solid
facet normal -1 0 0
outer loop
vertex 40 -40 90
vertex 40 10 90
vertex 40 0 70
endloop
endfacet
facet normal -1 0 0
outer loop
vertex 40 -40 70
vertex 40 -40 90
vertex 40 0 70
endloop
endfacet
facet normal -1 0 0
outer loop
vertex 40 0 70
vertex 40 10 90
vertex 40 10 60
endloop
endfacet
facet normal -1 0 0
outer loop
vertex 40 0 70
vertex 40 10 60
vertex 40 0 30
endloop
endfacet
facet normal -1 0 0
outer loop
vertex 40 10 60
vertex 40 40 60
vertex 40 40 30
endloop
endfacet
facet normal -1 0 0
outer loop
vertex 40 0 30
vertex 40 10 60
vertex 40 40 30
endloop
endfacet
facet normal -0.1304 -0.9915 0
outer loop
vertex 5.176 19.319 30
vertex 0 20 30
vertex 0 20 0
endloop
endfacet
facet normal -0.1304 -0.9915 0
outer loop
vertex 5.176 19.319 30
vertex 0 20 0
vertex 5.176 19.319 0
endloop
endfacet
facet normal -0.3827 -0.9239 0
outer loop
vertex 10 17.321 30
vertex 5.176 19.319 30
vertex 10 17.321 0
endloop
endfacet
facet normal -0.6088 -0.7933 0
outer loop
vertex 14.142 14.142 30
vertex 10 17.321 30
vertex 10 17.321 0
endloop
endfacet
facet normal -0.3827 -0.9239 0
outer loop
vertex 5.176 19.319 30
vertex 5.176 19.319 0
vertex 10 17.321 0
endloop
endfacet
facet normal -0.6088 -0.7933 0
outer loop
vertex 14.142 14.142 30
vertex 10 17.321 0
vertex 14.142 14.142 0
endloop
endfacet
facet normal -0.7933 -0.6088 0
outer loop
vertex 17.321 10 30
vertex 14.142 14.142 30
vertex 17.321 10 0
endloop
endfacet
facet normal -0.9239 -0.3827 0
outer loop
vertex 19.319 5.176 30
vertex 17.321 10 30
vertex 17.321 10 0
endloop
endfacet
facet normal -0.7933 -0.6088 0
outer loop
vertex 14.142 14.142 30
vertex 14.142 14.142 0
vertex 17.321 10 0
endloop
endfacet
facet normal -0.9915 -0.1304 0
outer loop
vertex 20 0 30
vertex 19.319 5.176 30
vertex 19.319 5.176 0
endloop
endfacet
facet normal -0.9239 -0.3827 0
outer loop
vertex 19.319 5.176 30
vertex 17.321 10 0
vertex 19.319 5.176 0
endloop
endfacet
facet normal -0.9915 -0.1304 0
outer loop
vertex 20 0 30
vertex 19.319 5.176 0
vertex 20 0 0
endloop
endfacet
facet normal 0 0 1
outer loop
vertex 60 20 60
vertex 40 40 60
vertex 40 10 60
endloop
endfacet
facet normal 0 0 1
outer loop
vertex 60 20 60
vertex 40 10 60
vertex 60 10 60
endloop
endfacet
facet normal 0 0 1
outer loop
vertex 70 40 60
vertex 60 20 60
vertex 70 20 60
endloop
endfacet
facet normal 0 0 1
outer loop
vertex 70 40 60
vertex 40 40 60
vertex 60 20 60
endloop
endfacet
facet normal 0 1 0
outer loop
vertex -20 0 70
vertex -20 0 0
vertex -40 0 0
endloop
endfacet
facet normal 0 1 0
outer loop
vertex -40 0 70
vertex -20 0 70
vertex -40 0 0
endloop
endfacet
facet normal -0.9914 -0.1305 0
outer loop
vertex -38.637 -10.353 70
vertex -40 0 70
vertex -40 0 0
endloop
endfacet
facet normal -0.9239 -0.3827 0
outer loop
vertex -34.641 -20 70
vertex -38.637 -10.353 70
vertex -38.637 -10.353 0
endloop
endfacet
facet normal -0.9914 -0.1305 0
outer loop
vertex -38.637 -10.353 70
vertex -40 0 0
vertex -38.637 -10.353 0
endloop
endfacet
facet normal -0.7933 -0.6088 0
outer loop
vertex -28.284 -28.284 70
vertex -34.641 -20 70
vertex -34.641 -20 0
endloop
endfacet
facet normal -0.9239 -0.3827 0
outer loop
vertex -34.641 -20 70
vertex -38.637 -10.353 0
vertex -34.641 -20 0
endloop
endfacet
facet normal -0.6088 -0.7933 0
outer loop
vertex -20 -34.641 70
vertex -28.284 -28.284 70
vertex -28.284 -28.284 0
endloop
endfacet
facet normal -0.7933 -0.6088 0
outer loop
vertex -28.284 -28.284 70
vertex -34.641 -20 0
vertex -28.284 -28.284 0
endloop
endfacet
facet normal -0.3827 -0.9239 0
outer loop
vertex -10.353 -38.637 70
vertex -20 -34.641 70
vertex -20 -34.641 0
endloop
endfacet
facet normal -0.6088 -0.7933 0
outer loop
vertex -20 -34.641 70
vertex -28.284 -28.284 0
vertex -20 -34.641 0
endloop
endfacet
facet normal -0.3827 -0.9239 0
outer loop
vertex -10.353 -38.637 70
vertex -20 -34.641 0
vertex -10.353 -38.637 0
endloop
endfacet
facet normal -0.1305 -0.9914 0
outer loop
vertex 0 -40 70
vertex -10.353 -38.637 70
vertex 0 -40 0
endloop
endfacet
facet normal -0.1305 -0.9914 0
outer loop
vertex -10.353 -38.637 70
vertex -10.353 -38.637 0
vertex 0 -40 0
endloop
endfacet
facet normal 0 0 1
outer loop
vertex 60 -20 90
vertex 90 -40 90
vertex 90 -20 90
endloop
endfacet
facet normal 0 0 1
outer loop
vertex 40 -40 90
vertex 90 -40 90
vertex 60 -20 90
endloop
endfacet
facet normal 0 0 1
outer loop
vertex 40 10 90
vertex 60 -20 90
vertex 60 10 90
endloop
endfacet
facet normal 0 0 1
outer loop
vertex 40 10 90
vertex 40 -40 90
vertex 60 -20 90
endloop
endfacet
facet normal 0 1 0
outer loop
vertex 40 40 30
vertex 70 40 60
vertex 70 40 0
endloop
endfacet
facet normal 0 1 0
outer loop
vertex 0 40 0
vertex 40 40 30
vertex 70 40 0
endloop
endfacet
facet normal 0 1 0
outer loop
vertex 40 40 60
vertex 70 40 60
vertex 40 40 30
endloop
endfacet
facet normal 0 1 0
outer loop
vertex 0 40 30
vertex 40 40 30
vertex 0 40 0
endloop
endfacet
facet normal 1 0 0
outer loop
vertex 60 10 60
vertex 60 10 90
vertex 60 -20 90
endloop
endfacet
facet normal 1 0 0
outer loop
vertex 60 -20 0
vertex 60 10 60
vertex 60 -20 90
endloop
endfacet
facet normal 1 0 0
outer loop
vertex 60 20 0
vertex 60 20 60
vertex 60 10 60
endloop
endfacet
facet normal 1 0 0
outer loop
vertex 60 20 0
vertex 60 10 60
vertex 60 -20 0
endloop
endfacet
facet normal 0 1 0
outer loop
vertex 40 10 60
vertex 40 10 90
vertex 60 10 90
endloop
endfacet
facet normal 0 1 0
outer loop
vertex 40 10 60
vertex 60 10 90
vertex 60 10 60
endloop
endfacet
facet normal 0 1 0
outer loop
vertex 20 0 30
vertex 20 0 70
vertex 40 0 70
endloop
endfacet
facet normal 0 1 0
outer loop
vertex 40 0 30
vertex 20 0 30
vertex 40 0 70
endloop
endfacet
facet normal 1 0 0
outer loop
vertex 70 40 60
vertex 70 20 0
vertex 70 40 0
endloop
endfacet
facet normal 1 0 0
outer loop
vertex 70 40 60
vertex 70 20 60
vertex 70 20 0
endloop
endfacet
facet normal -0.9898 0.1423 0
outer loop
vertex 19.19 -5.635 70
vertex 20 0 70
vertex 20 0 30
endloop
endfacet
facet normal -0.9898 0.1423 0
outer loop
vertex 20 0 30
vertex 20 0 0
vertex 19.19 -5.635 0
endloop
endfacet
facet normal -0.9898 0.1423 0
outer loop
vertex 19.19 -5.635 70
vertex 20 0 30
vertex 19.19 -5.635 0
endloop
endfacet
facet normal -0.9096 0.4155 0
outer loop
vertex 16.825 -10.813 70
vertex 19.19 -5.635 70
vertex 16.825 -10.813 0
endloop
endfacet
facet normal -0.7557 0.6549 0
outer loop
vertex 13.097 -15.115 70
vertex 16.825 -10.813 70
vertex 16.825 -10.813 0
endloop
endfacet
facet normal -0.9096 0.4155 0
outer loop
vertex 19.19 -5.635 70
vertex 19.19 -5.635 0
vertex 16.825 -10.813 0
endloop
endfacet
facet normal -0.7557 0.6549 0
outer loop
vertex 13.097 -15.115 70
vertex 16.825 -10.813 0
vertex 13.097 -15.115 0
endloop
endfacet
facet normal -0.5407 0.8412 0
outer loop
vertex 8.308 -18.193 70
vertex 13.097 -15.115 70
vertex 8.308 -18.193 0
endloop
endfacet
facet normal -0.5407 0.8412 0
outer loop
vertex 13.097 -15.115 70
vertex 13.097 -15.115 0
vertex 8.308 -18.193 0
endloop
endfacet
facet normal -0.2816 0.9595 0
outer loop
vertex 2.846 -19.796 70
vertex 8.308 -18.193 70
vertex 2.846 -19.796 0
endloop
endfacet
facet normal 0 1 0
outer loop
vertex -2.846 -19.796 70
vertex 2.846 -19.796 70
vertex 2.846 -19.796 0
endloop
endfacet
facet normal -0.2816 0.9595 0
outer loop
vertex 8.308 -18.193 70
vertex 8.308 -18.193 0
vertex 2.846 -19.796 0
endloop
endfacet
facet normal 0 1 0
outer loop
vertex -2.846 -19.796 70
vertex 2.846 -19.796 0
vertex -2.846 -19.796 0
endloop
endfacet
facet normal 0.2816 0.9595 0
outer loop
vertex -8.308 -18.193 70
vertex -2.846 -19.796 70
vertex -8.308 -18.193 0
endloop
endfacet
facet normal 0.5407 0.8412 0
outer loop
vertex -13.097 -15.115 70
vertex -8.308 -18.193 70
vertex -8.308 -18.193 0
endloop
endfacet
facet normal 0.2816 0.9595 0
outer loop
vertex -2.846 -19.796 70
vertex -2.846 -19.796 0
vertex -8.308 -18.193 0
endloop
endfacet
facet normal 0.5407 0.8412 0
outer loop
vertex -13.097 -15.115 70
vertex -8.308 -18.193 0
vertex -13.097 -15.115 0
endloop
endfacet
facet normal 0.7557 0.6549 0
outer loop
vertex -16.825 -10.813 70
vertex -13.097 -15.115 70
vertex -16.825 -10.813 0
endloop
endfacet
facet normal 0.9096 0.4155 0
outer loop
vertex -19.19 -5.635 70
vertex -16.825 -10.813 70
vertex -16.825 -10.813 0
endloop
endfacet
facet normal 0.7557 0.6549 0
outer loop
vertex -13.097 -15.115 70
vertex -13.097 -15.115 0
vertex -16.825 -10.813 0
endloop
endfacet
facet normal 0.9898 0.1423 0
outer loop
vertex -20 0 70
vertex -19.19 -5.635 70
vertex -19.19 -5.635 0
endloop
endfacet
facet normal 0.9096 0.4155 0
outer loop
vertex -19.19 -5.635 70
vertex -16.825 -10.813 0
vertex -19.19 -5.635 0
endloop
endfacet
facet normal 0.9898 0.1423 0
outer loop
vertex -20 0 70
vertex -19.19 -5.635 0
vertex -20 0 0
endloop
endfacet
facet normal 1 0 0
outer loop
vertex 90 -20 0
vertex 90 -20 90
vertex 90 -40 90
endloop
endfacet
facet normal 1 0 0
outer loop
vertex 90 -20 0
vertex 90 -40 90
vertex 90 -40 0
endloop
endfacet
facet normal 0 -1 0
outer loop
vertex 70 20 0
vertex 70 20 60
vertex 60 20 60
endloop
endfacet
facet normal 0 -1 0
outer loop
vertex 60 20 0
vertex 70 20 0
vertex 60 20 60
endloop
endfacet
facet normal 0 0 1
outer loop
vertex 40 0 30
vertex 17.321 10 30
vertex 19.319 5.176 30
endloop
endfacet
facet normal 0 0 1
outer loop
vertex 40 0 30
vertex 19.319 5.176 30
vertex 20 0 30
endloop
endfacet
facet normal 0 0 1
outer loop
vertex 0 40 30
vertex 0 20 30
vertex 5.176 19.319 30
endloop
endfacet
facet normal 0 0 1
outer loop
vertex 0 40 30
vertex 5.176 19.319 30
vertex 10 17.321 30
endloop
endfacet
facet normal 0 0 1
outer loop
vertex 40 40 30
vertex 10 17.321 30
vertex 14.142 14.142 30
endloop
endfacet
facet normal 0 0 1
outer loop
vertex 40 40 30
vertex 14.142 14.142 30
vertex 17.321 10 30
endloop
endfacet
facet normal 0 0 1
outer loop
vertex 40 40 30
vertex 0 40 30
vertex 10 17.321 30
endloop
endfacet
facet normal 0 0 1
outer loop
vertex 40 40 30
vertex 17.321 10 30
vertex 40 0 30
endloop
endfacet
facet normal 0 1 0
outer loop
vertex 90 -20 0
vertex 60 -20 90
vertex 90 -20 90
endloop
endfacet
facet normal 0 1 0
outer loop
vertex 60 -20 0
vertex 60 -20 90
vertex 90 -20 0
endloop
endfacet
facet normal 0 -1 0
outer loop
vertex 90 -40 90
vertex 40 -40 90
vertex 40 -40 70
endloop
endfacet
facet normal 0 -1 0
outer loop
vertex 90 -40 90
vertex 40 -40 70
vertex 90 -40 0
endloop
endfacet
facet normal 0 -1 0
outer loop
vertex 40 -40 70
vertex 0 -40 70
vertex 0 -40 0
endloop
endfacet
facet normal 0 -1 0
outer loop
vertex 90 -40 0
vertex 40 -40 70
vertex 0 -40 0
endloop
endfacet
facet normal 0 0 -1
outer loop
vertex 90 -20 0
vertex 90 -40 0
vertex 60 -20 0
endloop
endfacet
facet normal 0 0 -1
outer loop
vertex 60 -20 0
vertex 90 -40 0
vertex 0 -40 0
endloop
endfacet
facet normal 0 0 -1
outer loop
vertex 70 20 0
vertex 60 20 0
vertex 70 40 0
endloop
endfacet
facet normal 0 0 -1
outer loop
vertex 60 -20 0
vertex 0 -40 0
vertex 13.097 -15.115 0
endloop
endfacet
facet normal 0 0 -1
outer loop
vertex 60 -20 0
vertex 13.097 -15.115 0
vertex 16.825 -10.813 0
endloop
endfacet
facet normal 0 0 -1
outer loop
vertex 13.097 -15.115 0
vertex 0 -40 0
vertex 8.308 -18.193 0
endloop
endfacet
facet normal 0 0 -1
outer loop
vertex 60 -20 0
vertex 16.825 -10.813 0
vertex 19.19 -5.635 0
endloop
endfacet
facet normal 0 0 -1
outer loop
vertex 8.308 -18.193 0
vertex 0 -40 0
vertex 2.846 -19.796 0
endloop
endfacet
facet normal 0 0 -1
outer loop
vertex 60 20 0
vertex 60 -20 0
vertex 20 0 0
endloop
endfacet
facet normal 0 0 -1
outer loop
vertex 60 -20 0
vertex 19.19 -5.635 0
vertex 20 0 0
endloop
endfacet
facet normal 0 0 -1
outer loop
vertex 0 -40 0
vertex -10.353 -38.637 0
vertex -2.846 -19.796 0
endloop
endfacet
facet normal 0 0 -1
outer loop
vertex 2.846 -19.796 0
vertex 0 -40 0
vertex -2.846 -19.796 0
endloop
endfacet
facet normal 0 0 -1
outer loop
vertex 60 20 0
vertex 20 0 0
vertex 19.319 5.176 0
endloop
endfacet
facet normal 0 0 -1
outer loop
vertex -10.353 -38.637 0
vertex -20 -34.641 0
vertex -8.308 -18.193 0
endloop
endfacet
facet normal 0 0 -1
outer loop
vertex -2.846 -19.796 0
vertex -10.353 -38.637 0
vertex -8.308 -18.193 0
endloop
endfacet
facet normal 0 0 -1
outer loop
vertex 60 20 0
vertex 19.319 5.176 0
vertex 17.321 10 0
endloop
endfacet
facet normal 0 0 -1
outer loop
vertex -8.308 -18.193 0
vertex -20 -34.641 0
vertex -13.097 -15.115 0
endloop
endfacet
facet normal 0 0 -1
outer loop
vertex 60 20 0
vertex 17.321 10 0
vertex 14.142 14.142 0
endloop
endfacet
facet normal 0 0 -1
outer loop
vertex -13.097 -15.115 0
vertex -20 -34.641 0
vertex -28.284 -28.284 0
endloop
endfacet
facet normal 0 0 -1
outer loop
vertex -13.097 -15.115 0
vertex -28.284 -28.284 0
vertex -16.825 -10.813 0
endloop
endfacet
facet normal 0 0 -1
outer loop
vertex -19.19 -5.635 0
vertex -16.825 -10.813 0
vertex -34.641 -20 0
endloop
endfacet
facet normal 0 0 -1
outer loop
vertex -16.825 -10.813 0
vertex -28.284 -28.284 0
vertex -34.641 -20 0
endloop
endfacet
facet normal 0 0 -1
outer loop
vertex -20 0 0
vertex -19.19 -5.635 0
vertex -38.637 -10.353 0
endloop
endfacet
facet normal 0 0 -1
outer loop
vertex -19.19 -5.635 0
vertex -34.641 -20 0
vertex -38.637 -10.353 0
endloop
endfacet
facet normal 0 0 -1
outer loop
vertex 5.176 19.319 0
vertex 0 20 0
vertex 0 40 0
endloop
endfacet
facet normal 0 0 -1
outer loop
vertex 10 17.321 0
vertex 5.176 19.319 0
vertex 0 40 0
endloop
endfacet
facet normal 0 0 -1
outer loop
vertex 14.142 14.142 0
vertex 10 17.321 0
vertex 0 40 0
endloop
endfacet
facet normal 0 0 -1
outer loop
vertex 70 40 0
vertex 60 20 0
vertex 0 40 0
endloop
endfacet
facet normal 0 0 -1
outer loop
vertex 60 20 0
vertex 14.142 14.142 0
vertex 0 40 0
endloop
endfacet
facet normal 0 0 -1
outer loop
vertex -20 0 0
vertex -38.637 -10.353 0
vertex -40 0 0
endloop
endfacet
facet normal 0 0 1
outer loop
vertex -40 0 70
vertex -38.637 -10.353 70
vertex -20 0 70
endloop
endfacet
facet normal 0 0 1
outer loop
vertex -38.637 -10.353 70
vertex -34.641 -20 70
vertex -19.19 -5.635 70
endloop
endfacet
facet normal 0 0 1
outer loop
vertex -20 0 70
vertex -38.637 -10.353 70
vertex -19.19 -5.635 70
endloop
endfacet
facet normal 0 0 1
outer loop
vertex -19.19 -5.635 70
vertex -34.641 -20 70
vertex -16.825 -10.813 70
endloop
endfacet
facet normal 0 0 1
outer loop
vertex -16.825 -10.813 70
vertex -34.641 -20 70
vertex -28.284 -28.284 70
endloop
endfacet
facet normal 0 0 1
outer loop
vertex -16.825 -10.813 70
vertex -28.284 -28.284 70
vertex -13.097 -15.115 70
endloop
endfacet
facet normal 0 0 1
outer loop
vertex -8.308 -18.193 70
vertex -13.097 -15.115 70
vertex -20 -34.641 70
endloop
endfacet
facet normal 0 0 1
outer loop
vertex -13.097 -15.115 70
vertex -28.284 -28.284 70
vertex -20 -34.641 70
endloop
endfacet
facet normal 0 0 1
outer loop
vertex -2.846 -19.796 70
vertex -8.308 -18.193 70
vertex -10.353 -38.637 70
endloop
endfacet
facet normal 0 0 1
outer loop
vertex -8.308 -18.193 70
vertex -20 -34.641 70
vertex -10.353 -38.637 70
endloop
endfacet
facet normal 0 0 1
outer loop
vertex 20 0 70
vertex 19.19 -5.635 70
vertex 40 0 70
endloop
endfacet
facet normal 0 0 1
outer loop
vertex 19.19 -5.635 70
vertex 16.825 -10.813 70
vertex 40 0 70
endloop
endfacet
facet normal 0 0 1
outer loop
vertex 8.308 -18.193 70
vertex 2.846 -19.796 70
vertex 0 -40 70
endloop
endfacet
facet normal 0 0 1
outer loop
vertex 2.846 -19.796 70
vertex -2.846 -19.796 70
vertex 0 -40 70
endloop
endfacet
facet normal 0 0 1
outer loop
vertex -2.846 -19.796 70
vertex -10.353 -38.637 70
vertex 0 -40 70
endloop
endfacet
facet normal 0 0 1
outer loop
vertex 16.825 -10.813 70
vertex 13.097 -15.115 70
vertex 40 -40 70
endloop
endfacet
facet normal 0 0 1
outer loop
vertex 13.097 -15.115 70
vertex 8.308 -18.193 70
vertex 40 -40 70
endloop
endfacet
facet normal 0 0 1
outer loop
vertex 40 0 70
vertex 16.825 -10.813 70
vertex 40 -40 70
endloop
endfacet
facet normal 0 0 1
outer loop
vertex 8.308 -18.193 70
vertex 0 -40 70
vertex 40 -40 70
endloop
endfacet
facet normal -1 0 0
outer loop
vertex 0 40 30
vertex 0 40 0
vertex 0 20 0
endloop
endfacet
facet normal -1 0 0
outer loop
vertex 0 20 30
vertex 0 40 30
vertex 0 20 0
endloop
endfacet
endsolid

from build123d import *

# Parameters (mm, degrees)
BOSS_EXTRUDE1_DEPTH  = 90
SKETCH2_W            = 30
SKETCH2_H            = 40
CUT_EXTRUDE1_DEPTH   = 90
SKETCH3_W            = 20
SKETCH3_H            = 20
CUT_EXTRUDE2_DEPTH   = 90
SKETCH4_W            = 80
SKETCH4_H            = 20
CUT_EXTRUDE3_DEPTH   = 90
SKETCH5_W            = 30
SKETCH5_H            = 30
CUT_EXTRUDE4_DEPTH   = 90
CUT_EXTRUDE6_DEPTH   = 40
BOSS_EXTRUDE6_DEPTH  = 30
CUT_EXTRUDE7_DEPTH   = 20
SKETCH12_W           = 10
SKETCH12_H           = 30
CUT_EXTRUDE8_DEPTH   = 20
SKETCH13_W           = 20
SKETCH13_H           = 30
CUT_EXTRUDE9_DEPTH   = 20
SKETCH14_W           = 21.421822341
SKETCH14_H           = 40
BOSS_EXTRUDE7_DEPTH  = 10
SKETCH16_W           = 20
SKETCH16_H           = 60
BOSS_EXTRUDE8_DEPTH  = 30
SKETCH17_W           = 30
SKETCH17_H           = 30
CUT_EXTRUDE10_DEPTH  = 20
SKETCH18_W           = 90
SKETCH18_H           = 30
BOSS_EXTRUDE9_DEPTH  = 10
SKETCH19_W           = 90
SKETCH19_H           = 20
BOSS_EXTRUDE10_DEPTH = 20
SKETCH21_W           = 10.0001
SKETCH21_H           = 30
BOSS_EXTRUDE13_DEPTH = 30
SKETCH22_W           = 10
SKETCH22_H           = 30
CUT_EXTRUDE13_DEPTH  = 29.999
SKETCH23_W           = 30
SKETCH23_H           = 29.999
CUT_EXTRUDE14_DEPTH  = 1
SKETCH24_W           = 10.0001
SKETCH24_H           = 30
CUT_EXTRUDE15_DEPTH  = 1
SKETCH25_W           = 10
SKETCH25_H           = 30
CUT_EXTRUDE16_DEPTH  = 10
SKETCH27_W           = 10
SKETCH27_H           = 10
CUT_EXTRUDE18_DEPTH  = 30
SKETCH30_W           = 20
SKETCH30_H           = 20
BOSS_EXTRUDE16_DEPTH = 30
SKETCH31_W           = 30
SKETCH31_H           = 20
BOSS_EXTRUDE17_DEPTH = 10


with BuildPart() as part:
    # Sketch1 → Boss-Extrude1 (new body)
    with BuildSketch(Plane.XY):
        with BuildLine():
            ThreePointArc((0, -40), (40, 0), (0, 40))
            Line((0, 40), (0, 20))
            ThreePointArc((0, 20), (14.142135624, 14.142135624), (20, 0))
            ThreePointArc((20, 0), (0, -20), (-20, 0))
            Line((-20, 0), (-40, 0))
            ThreePointArc((-40, 0), (-28.284271247, -28.284271247), (0, -40))
        make_face()
        with BuildLine():
            Line((70, 40), (0, 40))
            ThreePointArc((0, 40), (40, 0), (0, -40))
            Line((0, -40), (70, -40))
            Line((70, -40), (70, 40))
        make_face()
    extrude(amount=BOSS_EXTRUDE1_DEPTH)

    # Sketch2 → Cut-Extrude1 (cut)
    with BuildSketch(Plane.XY.offset(90)):
        with Locations((55, 0)):
            Rectangle(SKETCH2_W, SKETCH2_H)
    extrude(amount=-CUT_EXTRUDE1_DEPTH, mode=Mode.SUBTRACT)

    # Sketch3 → Cut-Extrude2 (cut)
    with BuildSketch(Plane.XY.offset(90)):
        with Locations((60, 30)):
            Rectangle(SKETCH3_W, SKETCH3_H)
    extrude(amount=-CUT_EXTRUDE2_DEPTH, mode=Mode.SUBTRACT)

    # Sketch4 → Cut-Extrude3 (cut)
    with BuildSketch(Plane(origin=(0, -40, 0), x_dir=(1, 0, 0), z_dir=(0, 1, 0))):
        with Locations((0, -80)):
            Rectangle(SKETCH4_W, SKETCH4_H)
    extrude(amount=CUT_EXTRUDE3_DEPTH, mode=Mode.SUBTRACT)

    # Sketch5 → Cut-Extrude4 (cut)
    with BuildSketch(Plane(origin=(0, 0, 0), x_dir=(0, 0, -1), z_dir=(1, 0, 0))):
        with Locations((-85, 25)):
            Rectangle(SKETCH5_W, SKETCH5_H)
    extrude(amount=CUT_EXTRUDE4_DEPTH, mode=Mode.SUBTRACT)

    # Sketch7 → Cut-Extrude6 (cut)
    with BuildSketch(Plane.XY.offset(70)):
        with BuildLine():
            Line((20, 0), (40, 0))
            Line((40, 0), (40, 40))
            Line((40, 40), (0, 40))
            Line((0, 40), (0, 20))
            ThreePointArc((0, 20), (14.142135624, 14.142135624), (20, 0))
        make_face()
    extrude(amount=-CUT_EXTRUDE6_DEPTH, mode=Mode.SUBTRACT)

    # Sketch10 → Boss-Extrude6 (add)
    with BuildSketch(Plane(origin=(70, 0, 0), x_dir=(0, 0, -1), z_dir=(1, 0, 0))):
        Polygon((-70, 20), (-70, 10), (-90, 10), (-90, -20), (-37.089362558, -20), (-21.421822341, -20), (-21.421822341, 20), align=None)
    extrude(amount=-BOSS_EXTRUDE6_DEPTH)

    # Sketch11 → Cut-Extrude7 (cut)
    with BuildSketch(Plane(origin=(70, 0, 0), x_dir=(0, 0, -1), z_dir=(1, 0, 0))):
        Polygon((-21.421822341, -20), (-70, -20), (-70, 10), (-70, 20), (-21.421822341, 20), align=None)
    extrude(amount=-CUT_EXTRUDE7_DEPTH, mode=Mode.SUBTRACT)

    # Sketch12 → Cut-Extrude8 (cut)
    with BuildSketch(Plane(origin=(50, 0, 0), x_dir=(0, 0, -1), z_dir=(1, 0, 0))):
        with Locations((-65, 25)):
            Rectangle(SKETCH12_W, SKETCH12_H)
    extrude(amount=-CUT_EXTRUDE8_DEPTH, mode=Mode.SUBTRACT)

    # Sketch13 → Cut-Extrude9 (cut)
    with BuildSketch(Plane(origin=(0, 0, 70), x_dir=(-1, 0, 0), z_dir=(0, 0, -1))):
        with Locations((-60, -5)):
            Rectangle(SKETCH13_W, SKETCH13_H)
    extrude(amount=-CUT_EXTRUDE9_DEPTH, mode=Mode.SUBTRACT)

    # Sketch14 → Boss-Extrude7 (add)
    with BuildSketch(Plane(origin=(40, 0, 0), x_dir=(0, 0, -1), z_dir=(1, 0, 0))):
        with Locations((-10.710911171, 0)):
            Rectangle(SKETCH14_W, SKETCH14_H)
    extrude(amount=BOSS_EXTRUDE7_DEPTH)

    # Sketch16 → Boss-Extrude8 (add)
    with BuildSketch(Plane(origin=(0, 40, 0), x_dir=(1, 0, 0), z_dir=(0, 1, 0))):
        with Locations((60, -30)):
            Rectangle(SKETCH16_W, SKETCH16_H)
    extrude(amount=-BOSS_EXTRUDE8_DEPTH)

    # Sketch17 → Cut-Extrude10 (cut)
    with BuildSketch(Plane(origin=(70, 0, 0), x_dir=(0, 0, -1), z_dir=(1, 0, 0))):
        with Locations((-15, 25)):
            Rectangle(SKETCH17_W, SKETCH17_H)
    extrude(amount=-CUT_EXTRUDE10_DEPTH, mode=Mode.SUBTRACT)

    # Sketch18 → Boss-Extrude9 (add)
    with BuildSketch(Plane(origin=(50, 0, 0), x_dir=(0, 0, -1), z_dir=(1, 0, 0))):
        with Locations((-45, -5)):
            Rectangle(SKETCH18_W, SKETCH18_H)
    extrude(amount=BOSS_EXTRUDE9_DEPTH)

    # Sketch19 → Boss-Extrude10 (add)
    with BuildSketch(Plane(origin=(70, 0, 0), x_dir=(0, 0, -1), z_dir=(1, 0, 0))):
        with Locations((-45, -30)):
            Rectangle(SKETCH19_W, SKETCH19_H)
    extrude(amount=BOSS_EXTRUDE10_DEPTH)

    # Sketch21 → Boss-Extrude13 (add)
    with BuildSketch(Plane(origin=(0, 0, 30), x_dir=(-1, 0, 0), z_dir=(0, 0, -1))):
        with Locations((-64.99995, 25)):
            Rectangle(SKETCH21_W, SKETCH21_H)
    extrude(amount=BOSS_EXTRUDE13_DEPTH)

    # Sketch22 → Cut-Extrude13 (cut)
    with BuildSketch(Plane.XZ.offset(-10)):
        with Locations((65, 15)):
            Rectangle(SKETCH22_W, SKETCH22_H)
    extrude(amount=-CUT_EXTRUDE13_DEPTH, mode=Mode.SUBTRACT)

    # Sketch23 → Cut-Extrude14 (cut)
    with BuildSketch(Plane(origin=(60, 0, 0), x_dir=(0, 0, -1), z_dir=(1, 0, 0))):
        with Locations((-15, 24.9995)):
            Rectangle(SKETCH23_W, SKETCH23_H)
    extrude(amount=-CUT_EXTRUDE14_DEPTH, mode=Mode.SUBTRACT)

    # Sketch24 → Cut-Extrude15 (cut)
    with BuildSketch(Plane.XZ.offset(-39.999)):
        with Locations((64.99995, 15)):
            Rectangle(SKETCH24_W, SKETCH24_H)
    extrude(amount=-CUT_EXTRUDE15_DEPTH, mode=Mode.SUBTRACT)

    # Sketch25 → Cut-Extrude16 (cut)
    with BuildSketch(Plane(origin=(0, 10, 0), x_dir=(1, 0, 0), z_dir=(0, 1, 0))):
        with Locations((55, -15)):
            Rectangle(SKETCH25_W, SKETCH25_H)
    extrude(amount=-CUT_EXTRUDE16_DEPTH, mode=Mode.SUBTRACT)

    # Sketch27 → Cut-Extrude18 (cut)
    with BuildSketch(Plane.XY.offset(60)):
        with Locations((65, 15)):
            Rectangle(SKETCH27_W, SKETCH27_H)
    extrude(amount=-CUT_EXTRUDE18_DEPTH, mode=Mode.SUBTRACT)

    # Sketch30 → Boss-Extrude16 (add)
    with BuildSketch(Plane(origin=(0, 0, 30), x_dir=(-1, 0, 0), z_dir=(0, 0, -1))):
        with Locations((-60, 30)):
            Rectangle(SKETCH30_W, SKETCH30_H)
    extrude(amount=BOSS_EXTRUDE16_DEPTH)

    # Sketch31 → Boss-Extrude17 (add)
    with BuildSketch(Plane(origin=(50, 0, 0), x_dir=(0, 0, -1), z_dir=(1, 0, 0))):
        with Locations((-15, 10)):
            Rectangle(SKETCH31_W, SKETCH31_H)
    extrude(amount=BOSS_EXTRUDE17_DEPTH)


solid = part.part
